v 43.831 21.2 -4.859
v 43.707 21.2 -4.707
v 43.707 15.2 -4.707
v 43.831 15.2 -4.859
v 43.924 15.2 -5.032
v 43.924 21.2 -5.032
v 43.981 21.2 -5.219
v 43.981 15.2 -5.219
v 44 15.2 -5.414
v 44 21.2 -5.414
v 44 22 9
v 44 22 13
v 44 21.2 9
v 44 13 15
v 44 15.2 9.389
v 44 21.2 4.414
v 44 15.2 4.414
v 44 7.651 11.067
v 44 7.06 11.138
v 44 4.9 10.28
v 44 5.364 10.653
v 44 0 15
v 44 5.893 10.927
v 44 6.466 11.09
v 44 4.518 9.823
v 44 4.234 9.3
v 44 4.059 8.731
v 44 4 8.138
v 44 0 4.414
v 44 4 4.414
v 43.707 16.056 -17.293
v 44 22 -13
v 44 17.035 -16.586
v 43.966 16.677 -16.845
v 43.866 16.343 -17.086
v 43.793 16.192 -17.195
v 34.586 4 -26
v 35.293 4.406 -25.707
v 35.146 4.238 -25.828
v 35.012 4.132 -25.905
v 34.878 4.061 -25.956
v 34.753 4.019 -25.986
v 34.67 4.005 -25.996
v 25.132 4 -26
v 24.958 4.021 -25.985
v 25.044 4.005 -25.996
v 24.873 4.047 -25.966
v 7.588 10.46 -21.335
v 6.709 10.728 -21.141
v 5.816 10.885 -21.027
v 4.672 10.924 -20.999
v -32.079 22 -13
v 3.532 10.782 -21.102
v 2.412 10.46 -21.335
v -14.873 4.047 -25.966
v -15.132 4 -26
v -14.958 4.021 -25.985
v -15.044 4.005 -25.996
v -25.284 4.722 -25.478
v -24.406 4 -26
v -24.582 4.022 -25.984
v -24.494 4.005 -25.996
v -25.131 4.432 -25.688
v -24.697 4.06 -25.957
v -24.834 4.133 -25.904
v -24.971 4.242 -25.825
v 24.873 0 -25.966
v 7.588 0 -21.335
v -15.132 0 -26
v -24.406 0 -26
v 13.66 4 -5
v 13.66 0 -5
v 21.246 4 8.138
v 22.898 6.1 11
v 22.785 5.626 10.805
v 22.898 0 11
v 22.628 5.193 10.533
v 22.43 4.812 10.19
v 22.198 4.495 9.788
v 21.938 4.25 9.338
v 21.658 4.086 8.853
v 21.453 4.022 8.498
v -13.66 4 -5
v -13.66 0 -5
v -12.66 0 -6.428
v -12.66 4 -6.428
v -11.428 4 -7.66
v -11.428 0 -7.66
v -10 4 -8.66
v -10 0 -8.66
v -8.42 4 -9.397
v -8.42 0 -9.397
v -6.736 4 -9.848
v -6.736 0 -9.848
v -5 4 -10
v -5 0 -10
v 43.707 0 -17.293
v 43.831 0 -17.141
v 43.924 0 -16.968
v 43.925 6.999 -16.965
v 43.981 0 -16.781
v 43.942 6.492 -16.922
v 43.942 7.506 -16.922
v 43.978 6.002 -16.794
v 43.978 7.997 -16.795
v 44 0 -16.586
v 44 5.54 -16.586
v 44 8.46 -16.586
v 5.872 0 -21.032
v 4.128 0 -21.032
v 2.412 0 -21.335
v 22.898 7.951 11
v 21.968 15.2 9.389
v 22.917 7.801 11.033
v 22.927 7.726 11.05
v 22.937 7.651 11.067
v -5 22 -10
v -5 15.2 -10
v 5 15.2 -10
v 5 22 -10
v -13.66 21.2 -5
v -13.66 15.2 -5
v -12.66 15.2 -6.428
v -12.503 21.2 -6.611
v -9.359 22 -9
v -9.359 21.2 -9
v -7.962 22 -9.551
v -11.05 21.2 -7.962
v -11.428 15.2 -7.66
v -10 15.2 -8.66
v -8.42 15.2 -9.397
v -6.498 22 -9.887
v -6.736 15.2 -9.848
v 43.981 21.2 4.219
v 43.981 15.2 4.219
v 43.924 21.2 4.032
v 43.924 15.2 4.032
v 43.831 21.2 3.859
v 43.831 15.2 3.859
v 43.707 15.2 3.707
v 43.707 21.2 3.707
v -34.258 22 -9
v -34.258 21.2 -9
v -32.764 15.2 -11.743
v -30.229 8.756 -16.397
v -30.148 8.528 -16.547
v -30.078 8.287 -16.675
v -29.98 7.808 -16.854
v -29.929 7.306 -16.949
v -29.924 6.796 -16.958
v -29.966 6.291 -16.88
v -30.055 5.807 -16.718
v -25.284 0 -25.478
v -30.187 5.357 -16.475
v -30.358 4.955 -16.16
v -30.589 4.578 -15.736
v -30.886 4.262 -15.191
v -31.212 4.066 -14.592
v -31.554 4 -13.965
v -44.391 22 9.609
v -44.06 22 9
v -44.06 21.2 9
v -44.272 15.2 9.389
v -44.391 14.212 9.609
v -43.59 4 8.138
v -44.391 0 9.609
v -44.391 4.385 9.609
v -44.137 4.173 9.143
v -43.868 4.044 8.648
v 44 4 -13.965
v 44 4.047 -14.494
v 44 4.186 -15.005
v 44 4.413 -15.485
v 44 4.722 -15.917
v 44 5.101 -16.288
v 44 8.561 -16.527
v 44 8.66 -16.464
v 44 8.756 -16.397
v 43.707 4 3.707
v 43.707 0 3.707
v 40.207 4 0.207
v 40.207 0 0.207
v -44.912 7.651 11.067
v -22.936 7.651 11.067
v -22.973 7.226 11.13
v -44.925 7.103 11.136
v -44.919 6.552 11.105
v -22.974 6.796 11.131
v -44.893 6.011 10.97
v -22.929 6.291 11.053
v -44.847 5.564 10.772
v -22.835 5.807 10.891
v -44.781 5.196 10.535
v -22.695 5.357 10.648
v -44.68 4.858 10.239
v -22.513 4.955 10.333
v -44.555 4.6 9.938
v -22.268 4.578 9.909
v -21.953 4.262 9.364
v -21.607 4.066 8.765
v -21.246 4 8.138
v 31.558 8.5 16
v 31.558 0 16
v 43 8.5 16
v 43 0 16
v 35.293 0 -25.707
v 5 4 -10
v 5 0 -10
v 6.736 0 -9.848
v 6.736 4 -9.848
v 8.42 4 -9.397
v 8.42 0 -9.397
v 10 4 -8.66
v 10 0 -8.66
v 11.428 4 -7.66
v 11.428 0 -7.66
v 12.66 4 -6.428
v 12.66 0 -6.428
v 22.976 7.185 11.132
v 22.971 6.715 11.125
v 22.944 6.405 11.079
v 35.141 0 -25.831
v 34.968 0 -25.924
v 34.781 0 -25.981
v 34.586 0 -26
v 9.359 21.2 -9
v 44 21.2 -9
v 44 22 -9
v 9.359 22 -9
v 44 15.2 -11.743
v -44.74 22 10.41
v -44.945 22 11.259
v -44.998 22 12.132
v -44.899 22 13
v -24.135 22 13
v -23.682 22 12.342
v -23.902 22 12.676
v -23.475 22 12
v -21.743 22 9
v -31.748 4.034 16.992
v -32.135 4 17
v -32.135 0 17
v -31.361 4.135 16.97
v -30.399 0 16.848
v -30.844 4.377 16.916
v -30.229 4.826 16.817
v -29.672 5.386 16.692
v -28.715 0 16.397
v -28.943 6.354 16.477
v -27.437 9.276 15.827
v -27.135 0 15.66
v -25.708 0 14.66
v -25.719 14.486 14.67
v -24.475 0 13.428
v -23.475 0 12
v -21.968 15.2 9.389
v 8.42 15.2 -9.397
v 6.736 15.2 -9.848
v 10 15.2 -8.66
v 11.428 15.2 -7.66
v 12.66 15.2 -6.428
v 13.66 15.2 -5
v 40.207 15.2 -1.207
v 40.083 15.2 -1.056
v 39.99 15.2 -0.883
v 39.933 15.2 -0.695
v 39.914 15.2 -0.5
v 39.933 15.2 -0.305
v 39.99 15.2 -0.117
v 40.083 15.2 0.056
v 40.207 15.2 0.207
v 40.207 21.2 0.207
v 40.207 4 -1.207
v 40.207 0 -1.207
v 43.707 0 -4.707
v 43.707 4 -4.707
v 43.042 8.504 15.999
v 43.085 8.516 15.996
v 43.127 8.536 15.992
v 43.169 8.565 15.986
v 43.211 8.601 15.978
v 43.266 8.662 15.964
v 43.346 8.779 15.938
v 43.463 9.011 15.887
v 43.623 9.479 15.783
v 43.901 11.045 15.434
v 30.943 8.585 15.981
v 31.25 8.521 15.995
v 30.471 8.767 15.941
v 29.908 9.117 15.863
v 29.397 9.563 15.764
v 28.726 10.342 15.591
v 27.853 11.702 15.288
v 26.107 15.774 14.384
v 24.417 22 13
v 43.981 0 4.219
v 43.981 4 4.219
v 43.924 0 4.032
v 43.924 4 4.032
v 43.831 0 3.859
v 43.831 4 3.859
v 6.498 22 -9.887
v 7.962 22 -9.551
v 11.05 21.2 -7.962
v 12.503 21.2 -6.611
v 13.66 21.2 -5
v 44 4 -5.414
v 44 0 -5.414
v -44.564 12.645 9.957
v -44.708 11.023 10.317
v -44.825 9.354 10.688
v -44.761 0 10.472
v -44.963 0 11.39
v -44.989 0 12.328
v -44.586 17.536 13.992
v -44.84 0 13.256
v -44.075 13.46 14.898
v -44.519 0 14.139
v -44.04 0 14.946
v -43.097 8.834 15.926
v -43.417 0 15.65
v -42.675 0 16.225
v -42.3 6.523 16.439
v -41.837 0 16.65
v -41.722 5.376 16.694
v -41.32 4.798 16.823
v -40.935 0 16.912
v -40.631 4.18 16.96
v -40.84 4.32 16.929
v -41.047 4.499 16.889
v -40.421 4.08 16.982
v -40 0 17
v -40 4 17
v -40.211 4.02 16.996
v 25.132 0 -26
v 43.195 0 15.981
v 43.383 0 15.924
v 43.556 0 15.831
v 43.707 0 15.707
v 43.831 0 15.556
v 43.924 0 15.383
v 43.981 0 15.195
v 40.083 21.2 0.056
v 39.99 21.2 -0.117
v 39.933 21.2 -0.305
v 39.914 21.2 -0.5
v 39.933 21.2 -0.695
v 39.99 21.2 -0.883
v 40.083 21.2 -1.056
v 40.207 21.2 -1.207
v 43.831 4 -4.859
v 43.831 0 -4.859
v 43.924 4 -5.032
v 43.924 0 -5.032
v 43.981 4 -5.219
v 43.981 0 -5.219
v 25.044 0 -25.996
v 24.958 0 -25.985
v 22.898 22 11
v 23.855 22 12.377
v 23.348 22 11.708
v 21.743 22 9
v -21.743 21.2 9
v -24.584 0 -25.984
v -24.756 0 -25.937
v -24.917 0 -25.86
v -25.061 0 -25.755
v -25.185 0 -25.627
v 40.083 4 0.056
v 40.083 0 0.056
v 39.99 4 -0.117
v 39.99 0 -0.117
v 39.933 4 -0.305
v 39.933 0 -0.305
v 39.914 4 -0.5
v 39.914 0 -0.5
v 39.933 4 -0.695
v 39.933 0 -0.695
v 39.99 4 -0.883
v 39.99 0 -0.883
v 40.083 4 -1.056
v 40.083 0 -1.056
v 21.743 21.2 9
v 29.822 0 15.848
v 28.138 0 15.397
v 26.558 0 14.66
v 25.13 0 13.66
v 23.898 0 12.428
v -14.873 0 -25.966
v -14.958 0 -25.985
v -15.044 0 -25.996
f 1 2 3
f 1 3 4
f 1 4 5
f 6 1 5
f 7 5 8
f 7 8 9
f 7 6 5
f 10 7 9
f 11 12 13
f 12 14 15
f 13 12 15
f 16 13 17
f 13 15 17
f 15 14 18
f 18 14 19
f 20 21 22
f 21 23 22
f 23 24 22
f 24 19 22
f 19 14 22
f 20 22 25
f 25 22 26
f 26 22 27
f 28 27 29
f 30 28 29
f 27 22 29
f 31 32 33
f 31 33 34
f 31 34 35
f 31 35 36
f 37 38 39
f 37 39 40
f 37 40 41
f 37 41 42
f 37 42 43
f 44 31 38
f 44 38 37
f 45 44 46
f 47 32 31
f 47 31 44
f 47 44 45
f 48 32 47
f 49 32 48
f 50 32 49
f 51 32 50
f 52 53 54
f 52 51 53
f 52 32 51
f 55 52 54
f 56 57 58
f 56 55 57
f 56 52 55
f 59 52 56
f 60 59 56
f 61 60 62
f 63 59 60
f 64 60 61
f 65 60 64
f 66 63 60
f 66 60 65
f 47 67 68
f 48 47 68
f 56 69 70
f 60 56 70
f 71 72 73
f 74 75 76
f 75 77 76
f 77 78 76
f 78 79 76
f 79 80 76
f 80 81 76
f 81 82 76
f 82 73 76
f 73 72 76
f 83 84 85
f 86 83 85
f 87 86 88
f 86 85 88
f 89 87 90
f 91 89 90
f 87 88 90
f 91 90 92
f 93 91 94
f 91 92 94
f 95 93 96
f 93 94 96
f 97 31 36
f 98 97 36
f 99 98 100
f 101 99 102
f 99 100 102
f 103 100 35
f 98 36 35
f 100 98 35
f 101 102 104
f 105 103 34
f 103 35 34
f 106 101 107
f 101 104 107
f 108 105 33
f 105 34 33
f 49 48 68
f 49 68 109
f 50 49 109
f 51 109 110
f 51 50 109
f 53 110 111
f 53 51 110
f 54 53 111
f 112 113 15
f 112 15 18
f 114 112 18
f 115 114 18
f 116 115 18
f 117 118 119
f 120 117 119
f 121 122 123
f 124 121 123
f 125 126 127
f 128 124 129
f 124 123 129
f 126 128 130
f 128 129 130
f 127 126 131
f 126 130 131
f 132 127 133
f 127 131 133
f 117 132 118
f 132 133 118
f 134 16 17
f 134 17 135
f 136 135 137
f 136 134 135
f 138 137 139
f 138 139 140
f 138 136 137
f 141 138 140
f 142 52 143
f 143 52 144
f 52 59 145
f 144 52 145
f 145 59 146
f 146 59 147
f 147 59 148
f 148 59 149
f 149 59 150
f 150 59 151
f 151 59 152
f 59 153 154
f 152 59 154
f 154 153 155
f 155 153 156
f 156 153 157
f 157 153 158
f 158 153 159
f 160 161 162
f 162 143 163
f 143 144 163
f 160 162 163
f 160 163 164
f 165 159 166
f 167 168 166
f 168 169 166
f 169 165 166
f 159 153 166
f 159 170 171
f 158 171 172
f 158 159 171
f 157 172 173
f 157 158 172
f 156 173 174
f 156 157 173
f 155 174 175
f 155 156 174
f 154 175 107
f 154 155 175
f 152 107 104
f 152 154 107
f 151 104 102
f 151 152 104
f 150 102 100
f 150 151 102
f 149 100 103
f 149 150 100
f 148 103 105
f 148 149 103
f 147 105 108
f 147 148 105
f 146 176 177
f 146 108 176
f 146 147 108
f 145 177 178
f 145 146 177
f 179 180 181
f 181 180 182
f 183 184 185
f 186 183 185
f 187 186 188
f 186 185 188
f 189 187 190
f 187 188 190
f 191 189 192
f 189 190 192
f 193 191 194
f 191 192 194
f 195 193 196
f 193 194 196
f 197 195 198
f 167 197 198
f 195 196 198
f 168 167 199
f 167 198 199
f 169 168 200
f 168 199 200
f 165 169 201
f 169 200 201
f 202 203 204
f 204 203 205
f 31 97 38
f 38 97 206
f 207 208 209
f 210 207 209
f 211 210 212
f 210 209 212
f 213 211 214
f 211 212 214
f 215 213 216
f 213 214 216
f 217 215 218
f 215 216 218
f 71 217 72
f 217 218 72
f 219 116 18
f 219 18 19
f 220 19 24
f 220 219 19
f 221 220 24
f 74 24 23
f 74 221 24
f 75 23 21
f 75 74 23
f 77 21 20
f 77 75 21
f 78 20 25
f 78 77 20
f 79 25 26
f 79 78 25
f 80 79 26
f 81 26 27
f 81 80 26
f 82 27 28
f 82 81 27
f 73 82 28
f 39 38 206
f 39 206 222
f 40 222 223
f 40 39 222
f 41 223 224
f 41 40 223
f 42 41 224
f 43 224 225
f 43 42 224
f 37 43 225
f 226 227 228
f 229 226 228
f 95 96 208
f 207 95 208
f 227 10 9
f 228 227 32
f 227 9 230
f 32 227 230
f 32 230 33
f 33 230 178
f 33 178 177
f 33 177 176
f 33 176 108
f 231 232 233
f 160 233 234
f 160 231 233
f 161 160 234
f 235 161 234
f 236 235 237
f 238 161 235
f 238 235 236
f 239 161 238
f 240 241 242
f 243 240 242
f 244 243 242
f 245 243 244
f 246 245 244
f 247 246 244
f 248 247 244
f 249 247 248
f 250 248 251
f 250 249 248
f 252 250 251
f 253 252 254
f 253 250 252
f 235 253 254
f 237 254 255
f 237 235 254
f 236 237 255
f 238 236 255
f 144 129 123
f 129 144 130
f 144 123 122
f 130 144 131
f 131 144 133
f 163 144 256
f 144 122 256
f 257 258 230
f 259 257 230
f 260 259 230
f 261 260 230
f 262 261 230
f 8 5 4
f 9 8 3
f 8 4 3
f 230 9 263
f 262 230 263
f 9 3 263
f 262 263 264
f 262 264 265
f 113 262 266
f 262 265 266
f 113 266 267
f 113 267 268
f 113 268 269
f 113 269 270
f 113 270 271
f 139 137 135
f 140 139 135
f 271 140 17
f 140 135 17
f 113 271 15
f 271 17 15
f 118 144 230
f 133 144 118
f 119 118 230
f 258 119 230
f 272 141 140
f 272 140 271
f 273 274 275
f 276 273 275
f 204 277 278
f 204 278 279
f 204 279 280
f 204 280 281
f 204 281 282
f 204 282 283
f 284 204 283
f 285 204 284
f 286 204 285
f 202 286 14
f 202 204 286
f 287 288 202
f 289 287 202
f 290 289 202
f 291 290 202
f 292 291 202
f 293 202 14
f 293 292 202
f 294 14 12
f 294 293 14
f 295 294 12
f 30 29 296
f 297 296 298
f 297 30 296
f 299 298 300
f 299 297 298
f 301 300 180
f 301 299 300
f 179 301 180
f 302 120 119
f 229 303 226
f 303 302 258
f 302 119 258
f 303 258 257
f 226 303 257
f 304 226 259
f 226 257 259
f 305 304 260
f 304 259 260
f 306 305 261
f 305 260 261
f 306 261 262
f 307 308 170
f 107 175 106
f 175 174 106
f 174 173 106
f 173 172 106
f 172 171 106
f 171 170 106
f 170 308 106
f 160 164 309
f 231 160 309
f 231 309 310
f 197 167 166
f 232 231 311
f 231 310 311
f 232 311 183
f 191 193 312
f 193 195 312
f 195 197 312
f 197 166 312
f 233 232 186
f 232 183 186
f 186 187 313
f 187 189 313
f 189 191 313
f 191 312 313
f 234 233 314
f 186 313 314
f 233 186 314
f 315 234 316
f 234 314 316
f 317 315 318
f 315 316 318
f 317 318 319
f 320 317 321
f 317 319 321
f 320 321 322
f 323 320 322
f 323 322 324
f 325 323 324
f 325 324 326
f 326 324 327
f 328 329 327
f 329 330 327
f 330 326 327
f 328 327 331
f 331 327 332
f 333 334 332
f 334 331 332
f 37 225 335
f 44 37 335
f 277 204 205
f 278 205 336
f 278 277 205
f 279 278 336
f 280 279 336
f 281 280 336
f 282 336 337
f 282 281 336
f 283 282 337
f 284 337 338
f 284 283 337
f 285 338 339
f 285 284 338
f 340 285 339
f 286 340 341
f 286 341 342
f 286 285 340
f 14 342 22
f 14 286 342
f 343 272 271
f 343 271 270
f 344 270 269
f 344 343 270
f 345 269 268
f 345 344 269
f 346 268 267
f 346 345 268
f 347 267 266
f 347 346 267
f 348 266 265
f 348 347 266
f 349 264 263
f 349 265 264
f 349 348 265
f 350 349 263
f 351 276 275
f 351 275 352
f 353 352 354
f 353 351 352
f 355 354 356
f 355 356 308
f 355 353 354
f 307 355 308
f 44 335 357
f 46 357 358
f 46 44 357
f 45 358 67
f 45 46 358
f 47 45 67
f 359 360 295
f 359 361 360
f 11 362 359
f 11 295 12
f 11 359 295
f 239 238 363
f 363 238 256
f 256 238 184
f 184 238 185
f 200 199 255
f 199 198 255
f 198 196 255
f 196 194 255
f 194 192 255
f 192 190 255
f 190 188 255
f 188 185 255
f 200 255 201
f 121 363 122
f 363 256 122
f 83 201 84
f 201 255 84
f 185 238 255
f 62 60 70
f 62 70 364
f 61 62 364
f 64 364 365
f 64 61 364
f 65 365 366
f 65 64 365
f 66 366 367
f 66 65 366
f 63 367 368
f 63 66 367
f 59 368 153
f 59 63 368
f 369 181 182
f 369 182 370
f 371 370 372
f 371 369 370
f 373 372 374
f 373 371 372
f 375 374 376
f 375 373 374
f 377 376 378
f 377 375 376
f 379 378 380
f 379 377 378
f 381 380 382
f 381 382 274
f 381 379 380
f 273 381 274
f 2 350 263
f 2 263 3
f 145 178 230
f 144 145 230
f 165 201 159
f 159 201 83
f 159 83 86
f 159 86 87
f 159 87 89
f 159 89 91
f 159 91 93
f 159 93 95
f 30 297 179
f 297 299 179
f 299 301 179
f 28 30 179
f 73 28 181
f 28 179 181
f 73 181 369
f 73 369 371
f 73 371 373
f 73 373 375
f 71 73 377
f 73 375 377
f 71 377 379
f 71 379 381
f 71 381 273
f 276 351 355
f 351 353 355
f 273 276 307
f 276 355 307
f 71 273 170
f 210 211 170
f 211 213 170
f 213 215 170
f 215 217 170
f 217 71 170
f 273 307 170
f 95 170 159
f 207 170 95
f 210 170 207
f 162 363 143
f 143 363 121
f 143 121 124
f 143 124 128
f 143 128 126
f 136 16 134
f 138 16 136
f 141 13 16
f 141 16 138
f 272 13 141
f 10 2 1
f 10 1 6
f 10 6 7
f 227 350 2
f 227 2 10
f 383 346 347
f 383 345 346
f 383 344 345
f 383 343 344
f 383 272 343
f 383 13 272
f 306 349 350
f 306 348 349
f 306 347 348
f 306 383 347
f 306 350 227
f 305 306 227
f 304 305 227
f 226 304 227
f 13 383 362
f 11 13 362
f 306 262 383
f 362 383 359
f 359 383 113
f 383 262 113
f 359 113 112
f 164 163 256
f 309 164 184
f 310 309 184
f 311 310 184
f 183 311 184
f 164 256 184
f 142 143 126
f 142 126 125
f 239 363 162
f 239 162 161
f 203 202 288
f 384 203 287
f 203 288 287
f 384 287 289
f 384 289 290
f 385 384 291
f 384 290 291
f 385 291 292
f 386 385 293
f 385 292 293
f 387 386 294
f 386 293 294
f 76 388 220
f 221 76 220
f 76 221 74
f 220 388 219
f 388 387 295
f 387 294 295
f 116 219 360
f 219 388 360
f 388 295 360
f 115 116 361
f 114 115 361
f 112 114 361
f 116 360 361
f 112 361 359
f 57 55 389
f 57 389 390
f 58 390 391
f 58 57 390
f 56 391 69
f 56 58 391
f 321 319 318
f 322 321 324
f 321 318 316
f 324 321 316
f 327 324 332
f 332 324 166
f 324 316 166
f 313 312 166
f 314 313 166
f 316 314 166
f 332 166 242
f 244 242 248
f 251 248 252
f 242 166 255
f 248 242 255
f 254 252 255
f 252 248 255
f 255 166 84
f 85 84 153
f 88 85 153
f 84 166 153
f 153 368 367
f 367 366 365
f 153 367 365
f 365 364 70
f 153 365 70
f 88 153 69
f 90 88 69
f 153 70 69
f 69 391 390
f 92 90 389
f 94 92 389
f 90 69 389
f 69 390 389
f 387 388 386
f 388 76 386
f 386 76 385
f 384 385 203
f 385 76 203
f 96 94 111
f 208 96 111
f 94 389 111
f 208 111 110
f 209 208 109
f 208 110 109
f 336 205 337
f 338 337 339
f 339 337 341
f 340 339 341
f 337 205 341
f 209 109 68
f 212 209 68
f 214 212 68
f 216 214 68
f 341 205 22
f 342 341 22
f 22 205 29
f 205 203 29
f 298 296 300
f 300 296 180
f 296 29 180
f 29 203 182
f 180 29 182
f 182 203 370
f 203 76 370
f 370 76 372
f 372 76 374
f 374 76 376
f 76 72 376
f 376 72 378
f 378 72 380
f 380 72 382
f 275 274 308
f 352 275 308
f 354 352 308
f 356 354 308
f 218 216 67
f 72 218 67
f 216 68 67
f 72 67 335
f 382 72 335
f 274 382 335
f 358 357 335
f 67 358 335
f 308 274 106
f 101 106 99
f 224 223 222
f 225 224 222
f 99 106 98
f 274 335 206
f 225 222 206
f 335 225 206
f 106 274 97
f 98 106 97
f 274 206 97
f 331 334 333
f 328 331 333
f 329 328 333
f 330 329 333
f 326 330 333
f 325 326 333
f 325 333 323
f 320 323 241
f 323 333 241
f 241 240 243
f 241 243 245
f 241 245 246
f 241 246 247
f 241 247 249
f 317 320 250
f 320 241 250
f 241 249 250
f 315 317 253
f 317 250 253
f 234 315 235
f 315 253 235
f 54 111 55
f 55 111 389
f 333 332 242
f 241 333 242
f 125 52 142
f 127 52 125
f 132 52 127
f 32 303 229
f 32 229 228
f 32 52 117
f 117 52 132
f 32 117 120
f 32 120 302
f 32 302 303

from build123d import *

# Parameters (mm, degrees)
SKETCH1_R               = 5
BOSS_EXTRUDE1_DEPTH     = 22
FILLET1_R               = 1
FILLET2_R               = 10
SKETCH3_W               = 18
SKETCH3_H               = 10
CUT_EXTRUDE2_DEPTH      = 45
CUT_EXTRUDE2_DEPTH_BACK = 46


with BuildPart() as part:
    # Sketch1 → Boss-Extrude1 (new body)
    with BuildSketch(Plane(origin=(0, 0, 0), x_dir=(1, 0, 0), z_dir=(0, 1, 0))):
        with BuildLine():
            Line((44, 17), (35, 26))
            Line((35, 26), (25, 26))
            Line((25, 26), (5, 20.641016151))
            Line((5, 20.641016151), (-15, 26))
            Line((-15, 26), (-25, 26))
            Line((-25, 26), (-44.391127187, -9.608765584))
            ThreePointArc((-44.391127187, -9.608765584), (-38.766232585, -7.154608585), (-35, -12))
            ThreePointArc((-35, -12), (-36.464466094, -15.535533906), (-40, -17))
            Line((-40, -17), (-26.36195996, -17))
            Line((-26.36195996, -17), (-13.660254038, 5))
            ThreePointArc((-13.660254038, 5), (-10, 8.660254038), (-5, 10))
            Line((-5, 10), (5, 10))
            ThreePointArc((5, 10), (10, 8.660254038), (13.660254038, 5))
            Line((13.660254038, 5), (25.784609691, -16))
            Line((25.784609691, -16), (44, -16))
            Line((44, -16), (44, -4))
            Line((44, -4), (39.5, 0.5))
            Line((39.5, 0.5), (44, 5))
            Line((44, 5), (44, 17))
        make_face()
        with Locations((-40, -12)):
            Circle(SKETCH1_R)
    extrude(amount=BOSS_EXTRUDE1_DEPTH)

    # Fillet1
    fillet1_edges = [part.edges().sort_by_distance(p)[0] for p in [
        (-25, 11, -26),
        (-15, 11, -26),
        (25, 11, -26),
        (35, 11, -26),
        (44, 11, -17),
        (44, 11, -5),
        (39.5, 11, -0.5),
        (44, 11, 4),
        (44, 11, 16),
    ]]
    fillet(fillet1_edges, radius=FILLET1_R)

    # Fillet2
    fillet2_edges = [part.edges().sort_by_distance(p)[0] for p in [
        (-26.36195996, 11, 17),
        (5, 11, -20.641016151),
        (25.784609691, 11, 16),
    ]]
    fillet(fillet2_edges, radius=FILLET2_R)

    # Sketch3 → Cut-Extrude2 (cut, two sides)
    with BuildSketch(Plane(origin=(0, 0, 0), x_dir=(0, 0, -1), z_dir=(1, 0, 0))) as cut_extrude2_sk:
        Polygon((-9, 22), (-9, 31.2), (-17, 31.2), (-17, 4), (-13, 22), align=None)
        with Locations((0, 26.2)):
            Rectangle(SKETCH3_W, SKETCH3_H)
        Polygon((26, 31.2), (9, 31.2), (9, 22), (13, 22), (26, 4), align=None)
        with BuildLine():
            Line((11.743443525, 15.2), (-9.389141968, 15.2))
            Line((-9.389141968, 15.2), (-11.066743885, 7.650791373))
            ThreePointArc((-11.066743885, 7.650791373), (-10.478308141, 5.122817819), (-8.138182705, 4))
            Line((-8.138182705, 4), (13.965065195, 4))
            ThreePointArc((13.965065195, 4), (16.636152519, 5.634242881), (16.39710288, 8.756471662))
            Line((16.39710288, 8.756471662), (11.743443525, 15.2))
        make_face()
    extrude(amount=CUT_EXTRUDE2_DEPTH, mode=Mode.SUBTRACT)
    extrude(cut_extrude2_sk.sketch, amount=-CUT_EXTRUDE2_DEPTH_BACK, mode=Mode.SUBTRACT)


solid = part.part
